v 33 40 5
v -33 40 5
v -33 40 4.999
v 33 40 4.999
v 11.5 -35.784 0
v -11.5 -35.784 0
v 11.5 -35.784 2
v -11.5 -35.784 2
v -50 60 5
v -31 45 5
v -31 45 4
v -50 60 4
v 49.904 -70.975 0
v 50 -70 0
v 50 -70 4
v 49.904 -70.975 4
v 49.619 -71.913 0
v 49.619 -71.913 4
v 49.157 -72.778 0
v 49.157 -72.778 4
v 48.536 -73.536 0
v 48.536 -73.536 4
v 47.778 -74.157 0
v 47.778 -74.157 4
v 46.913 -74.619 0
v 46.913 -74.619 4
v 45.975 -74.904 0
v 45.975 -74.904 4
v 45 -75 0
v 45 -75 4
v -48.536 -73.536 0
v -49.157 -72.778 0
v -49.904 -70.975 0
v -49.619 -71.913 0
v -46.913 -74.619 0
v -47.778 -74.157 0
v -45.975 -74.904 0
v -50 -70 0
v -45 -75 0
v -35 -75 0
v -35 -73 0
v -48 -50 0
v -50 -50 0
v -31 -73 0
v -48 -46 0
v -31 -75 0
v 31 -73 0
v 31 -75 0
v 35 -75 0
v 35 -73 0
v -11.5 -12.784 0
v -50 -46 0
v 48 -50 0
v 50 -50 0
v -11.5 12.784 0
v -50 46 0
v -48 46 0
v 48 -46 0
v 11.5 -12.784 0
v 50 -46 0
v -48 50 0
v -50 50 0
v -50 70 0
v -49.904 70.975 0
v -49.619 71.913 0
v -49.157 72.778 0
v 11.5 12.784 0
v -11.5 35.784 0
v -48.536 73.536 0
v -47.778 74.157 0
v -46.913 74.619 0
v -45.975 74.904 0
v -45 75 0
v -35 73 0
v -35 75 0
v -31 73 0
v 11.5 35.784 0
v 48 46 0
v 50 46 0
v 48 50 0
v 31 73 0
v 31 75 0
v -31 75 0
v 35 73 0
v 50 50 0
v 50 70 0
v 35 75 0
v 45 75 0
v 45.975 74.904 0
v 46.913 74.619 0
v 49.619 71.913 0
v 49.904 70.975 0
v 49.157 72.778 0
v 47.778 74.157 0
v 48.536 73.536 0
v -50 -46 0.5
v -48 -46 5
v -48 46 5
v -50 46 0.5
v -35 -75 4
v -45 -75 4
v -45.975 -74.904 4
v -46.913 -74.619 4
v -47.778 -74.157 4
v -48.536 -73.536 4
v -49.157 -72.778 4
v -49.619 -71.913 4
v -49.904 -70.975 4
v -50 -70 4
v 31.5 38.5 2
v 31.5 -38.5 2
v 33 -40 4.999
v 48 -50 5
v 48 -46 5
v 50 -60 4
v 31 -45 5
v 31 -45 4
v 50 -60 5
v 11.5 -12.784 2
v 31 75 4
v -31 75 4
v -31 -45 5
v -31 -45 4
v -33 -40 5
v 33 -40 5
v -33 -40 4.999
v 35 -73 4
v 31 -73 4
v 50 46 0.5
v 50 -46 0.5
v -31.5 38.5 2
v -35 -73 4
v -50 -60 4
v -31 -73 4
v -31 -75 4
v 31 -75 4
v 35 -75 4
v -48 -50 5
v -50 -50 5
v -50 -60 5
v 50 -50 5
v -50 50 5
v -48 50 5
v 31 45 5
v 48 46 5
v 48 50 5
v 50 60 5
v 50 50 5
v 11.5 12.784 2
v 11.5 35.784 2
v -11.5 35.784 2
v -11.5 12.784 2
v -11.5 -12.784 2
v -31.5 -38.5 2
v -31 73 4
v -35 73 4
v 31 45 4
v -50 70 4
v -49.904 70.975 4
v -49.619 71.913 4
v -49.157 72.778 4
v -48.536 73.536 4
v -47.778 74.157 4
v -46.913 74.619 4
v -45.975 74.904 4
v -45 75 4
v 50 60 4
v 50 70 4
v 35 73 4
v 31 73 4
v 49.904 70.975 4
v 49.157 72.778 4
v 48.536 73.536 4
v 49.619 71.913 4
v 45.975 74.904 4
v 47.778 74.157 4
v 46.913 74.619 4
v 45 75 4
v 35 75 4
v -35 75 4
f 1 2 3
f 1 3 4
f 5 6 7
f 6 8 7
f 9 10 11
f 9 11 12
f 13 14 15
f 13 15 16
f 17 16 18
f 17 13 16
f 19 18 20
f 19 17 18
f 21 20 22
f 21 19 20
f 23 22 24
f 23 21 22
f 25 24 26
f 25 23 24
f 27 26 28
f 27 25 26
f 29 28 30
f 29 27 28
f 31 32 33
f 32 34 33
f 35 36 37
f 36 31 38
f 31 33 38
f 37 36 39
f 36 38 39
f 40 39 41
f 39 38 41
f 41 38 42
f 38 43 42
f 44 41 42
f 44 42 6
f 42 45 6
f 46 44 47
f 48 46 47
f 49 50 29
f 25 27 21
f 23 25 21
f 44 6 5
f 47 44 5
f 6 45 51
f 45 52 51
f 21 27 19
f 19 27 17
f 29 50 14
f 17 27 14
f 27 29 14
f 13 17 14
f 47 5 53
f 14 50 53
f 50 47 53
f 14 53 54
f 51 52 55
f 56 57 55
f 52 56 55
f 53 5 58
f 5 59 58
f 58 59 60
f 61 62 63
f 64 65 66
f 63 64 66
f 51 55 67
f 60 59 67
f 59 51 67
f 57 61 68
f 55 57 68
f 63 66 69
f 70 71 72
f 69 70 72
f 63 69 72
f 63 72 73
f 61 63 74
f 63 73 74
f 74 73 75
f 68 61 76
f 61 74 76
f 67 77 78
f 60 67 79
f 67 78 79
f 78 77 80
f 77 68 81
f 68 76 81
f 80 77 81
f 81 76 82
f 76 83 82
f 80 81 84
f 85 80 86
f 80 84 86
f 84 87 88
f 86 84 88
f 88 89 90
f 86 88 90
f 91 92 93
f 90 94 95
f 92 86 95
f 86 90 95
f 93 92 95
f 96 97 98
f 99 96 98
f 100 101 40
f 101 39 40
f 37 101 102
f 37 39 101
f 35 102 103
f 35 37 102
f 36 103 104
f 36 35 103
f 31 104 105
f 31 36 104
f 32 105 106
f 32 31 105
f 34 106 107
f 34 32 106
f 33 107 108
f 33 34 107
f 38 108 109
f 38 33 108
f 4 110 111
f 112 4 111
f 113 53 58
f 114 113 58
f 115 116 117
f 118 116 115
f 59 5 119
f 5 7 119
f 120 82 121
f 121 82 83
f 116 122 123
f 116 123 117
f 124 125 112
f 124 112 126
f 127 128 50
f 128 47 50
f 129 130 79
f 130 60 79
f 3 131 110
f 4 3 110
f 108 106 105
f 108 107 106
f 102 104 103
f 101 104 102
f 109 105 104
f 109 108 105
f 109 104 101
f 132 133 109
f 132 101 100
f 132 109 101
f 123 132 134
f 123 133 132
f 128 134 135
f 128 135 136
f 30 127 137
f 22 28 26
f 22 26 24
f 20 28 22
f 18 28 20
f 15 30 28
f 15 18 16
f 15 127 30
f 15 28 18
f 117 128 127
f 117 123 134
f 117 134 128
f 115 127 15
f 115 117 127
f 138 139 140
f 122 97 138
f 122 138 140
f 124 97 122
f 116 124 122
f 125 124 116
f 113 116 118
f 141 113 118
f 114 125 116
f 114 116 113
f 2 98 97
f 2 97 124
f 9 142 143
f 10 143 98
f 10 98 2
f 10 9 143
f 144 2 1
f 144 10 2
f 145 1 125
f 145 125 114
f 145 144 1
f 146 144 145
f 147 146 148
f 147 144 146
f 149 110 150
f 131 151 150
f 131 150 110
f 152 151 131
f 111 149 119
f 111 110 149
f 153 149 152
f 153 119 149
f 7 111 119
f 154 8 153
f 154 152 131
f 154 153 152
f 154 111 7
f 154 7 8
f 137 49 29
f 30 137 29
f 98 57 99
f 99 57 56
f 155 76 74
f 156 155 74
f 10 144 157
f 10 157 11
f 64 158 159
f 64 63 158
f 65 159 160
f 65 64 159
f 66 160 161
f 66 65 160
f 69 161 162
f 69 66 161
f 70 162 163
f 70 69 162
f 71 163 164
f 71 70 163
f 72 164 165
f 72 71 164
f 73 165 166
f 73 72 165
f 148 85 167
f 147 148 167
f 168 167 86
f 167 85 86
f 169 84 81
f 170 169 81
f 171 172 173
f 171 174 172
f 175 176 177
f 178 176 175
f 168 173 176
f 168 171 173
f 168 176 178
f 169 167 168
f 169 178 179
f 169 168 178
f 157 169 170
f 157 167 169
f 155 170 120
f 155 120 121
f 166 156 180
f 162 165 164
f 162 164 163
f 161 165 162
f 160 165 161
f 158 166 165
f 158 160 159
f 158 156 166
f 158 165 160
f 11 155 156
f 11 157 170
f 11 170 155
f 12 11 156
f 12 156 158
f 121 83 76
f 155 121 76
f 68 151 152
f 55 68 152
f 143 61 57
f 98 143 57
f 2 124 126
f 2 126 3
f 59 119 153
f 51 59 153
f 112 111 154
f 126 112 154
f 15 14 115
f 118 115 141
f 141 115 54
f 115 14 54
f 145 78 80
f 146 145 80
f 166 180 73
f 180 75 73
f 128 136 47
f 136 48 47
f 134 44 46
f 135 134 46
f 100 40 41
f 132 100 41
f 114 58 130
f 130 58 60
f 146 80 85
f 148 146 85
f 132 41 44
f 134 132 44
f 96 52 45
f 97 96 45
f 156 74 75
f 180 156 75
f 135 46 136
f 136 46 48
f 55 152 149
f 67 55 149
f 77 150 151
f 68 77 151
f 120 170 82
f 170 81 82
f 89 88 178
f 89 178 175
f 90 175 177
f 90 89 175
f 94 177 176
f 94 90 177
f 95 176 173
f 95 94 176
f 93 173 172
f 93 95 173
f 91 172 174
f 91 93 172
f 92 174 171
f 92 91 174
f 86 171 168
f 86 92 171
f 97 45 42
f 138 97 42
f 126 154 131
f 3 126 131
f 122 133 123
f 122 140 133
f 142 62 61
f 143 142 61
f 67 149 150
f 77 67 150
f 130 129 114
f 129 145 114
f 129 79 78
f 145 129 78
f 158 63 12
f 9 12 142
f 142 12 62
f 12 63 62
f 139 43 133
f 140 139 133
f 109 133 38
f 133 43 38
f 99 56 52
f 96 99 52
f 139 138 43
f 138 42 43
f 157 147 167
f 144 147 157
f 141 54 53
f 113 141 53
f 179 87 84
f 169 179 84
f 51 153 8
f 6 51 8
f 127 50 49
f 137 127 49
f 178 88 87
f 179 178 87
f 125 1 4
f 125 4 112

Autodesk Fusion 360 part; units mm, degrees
sketch "Body Quarter" plane through (0, 0, 0) normal (0, 0, 1) x (1, 0, 0)
  arc A0 (-45, 75) -> (-50, 70) centre (-45, 70) ccw
  line L0 (-50, 50) -> (-48, 50)
  line L1 (-48, 50) -> (-48, 46)
  line L2 (-48, 46) -> (-50, 46)
  line L3 (-50, 70) -> (-50, 50)
  line L4 (0, 0) -> (0, 75)
  line L5 (0, 0) -> (-50, 0)
  line L6 (-50, 46) -> (-50, 0)
  line L7 (-31, 75) -> (-31, 73)
  line L8 (-31, 73) -> (-35, 73)
  line L9 (-35, 73) -> (-35, 75)
  line L10 (0, 75) -> (-31, 75)
  line L11 (-35, 75) -> (-45, 75)
  dimension "d12" = 2
  dimension "d13" = 4
  dimension "d14" = 25
  dimension "d16" = 50
  dimension "d25" = 4
  dimension "d26" = 2
  dimension "d27" = 15
  dimension "d28" = 75
  dimension "d50" = 5
extrude "Extrude1" add sketch "Body Quarter" along normal blind 5
chamfer "Chamfer4" distance 4.5 distance2 2 1 edges at (-50, 23, 5) measured on face at (-50, 30.6667, 3.3333)
sketch "Sketch4" plane through (0, 0, 5) normal (0, 0, 1) x (-1, 0, 0)
  line L0 (48, -46) -> (48, 0)
  line L1 (48, 0) -> (0, 0)
  line L2 (0, 0) -> (0, -75)
  line L3 (0, -75) -> (31, -75)
  line L4 (31, -75) -> (31, -73)
  line L5 (31, -73) -> (35, -73)
  line L6 (35, -73) -> (35, -75)
  line L7 (35, -75) -> (45, -75)
  arc A0 (45, -75) -> (50, -70) centre (45, -70) ccw
  line L8 (50, -70) -> (50, -50)
  line L9 (50, -50) -> (48, -50)
  line L10 (48, -50) -> (48, -46)
  line L11 (0, 0) -> (33, 0)
  line L12 (33, 0) -> (33, -40)
  line L13 (33, -40) -> (0, -40)
  line L14 (0, -40) -> (0, 0)
  dimension "d57" = 40
  dimension "d58" = 33
extrude "Extrude4" cut sketch "Sketch4" against normal blind 3 contours L1 L2 L11 L12 L13 L14
chamfer "Chamfer5" distance 3 distance2 1.5 2 edges at (-33, 20, 2) (-16.5, 40, 2) measured on face at (-33, 13.3333, 4) measured on face at (-22, 40, 4)
sketch "Sketch5" plane through (0, 0, 5) normal (0, 0, 1) x (-1, 0, 0)
  line L0 (33, -40) -> (0, -40)
  line L1 (0, -40) -> (0, -75)
  line L2 (0, -75) -> (31, -75)
  line L3 (31, -75) -> (31, -73)
  line L4 (31, -73) -> (35, -73)
  line L5 (35, -73) -> (35, -75)
  line L6 (35, -75) -> (45, -75)
  arc A0 (45, -75) -> (50, -70) centre (45, -70) ccw
  line L7 (50, -70) -> (50, -50)
  line L8 (50, -50) -> (48, -50)
  line L9 (48, -50) -> (48, -46)
  line L10 (48, -46) -> (48, 0)
  line L11 (48, 0) -> (33, 0)
  line L12 (33, 0) -> (33, -40)
  line L13 (0, -45) -> (31, -45)
  line L14 (31, -45) -> (50, -60)
extrude "Extrude5" cut sketch "Sketch5" against normal blind 1 contours L1 L2 L3 L4 L5 L6 A0 L7 L13 L14
mirror "Mirror1" about plane through (0, 0, 0) normal (1, 0, 0) of bodies 1 merged
mirror "Mirror2" about plane through (0, 0, 0) normal (0, -1, 0) of bodies 1 merged
sketch "Mech Hole" plane through (0, 0, 5) normal (0, 0, 1) x (-1, 0, 0)
  line L0 (50, -60) -> (50, -50)
  line L1 (50, -50) -> (48, -50)
  line L2 (48, -50) -> (48, -46)
  line L3 (48, 46) -> (48, 50)
  line L4 (48, 50) -> (50, 50)
  line L5 (50, 50) -> (50, 60)
  line L6 (-50, 60) -> (-50, 50)
  line L7 (-50, 50) -> (-48, 50)
  line L8 (-48, 50) -> (-48, 46)
  line L9 (-48, -46) -> (-48, -50)
  line L10 (-48, -50) -> (-50, -50)
  line L11 (-50, -50) -> (-50, -60)
  line L12 (-11.5, -35.7841) -> (11.5, -35.7841)
  line L13 (11.5, -35.7841) -> (11.5, -12.7841)
  line L14 (11.5, -12.7841) -> (-11.5, -12.7841)
  line L15 (-11.5, -12.7841) -> (-11.5, -35.7841)
  line L16 (-11.5, -35.7841) -> (11.5, -12.7841) construction
  line L17 (11.5, -35.7841) -> (-11.5, -12.7841) construction
  line L18 (48, -46) -> (48, 46)
  line L19 (-48, 46) -> (-48, -46)
  line L20 (-50, -60) -> (-31, -45)
  line L21 (-31, -45) -> (31, -45)
  line L22 (31, -45) -> (50, -60)
  line L23 (50, 60) -> (31, 45)
  line L24 (31, 45) -> (-31, 45)
  line L25 (-31, 45) -> (-50, 60)
  line L26 (-33, -40) -> (-33, 40)
  line L27 (-33, 40) -> (33, 40)
  line L28 (33, 40) -> (33, -40)
  line L29 (33, -40) -> (-33, -40)
  point P0 (0, -24.2841)
  dimension "d39" = 23
extrude "Extrude2" cut sketch "Mech Hole" against normal through all contours L12 L13 L14 L15
mirror "Mirror3" about plane through (0, 0, 0) normal (0, 1, 0) of "Extrude2"
equation "d16 = ( 100 / 2 ) * 1 mm"
equation "d28 = ( 150 / 2 ) * 1 mm"
